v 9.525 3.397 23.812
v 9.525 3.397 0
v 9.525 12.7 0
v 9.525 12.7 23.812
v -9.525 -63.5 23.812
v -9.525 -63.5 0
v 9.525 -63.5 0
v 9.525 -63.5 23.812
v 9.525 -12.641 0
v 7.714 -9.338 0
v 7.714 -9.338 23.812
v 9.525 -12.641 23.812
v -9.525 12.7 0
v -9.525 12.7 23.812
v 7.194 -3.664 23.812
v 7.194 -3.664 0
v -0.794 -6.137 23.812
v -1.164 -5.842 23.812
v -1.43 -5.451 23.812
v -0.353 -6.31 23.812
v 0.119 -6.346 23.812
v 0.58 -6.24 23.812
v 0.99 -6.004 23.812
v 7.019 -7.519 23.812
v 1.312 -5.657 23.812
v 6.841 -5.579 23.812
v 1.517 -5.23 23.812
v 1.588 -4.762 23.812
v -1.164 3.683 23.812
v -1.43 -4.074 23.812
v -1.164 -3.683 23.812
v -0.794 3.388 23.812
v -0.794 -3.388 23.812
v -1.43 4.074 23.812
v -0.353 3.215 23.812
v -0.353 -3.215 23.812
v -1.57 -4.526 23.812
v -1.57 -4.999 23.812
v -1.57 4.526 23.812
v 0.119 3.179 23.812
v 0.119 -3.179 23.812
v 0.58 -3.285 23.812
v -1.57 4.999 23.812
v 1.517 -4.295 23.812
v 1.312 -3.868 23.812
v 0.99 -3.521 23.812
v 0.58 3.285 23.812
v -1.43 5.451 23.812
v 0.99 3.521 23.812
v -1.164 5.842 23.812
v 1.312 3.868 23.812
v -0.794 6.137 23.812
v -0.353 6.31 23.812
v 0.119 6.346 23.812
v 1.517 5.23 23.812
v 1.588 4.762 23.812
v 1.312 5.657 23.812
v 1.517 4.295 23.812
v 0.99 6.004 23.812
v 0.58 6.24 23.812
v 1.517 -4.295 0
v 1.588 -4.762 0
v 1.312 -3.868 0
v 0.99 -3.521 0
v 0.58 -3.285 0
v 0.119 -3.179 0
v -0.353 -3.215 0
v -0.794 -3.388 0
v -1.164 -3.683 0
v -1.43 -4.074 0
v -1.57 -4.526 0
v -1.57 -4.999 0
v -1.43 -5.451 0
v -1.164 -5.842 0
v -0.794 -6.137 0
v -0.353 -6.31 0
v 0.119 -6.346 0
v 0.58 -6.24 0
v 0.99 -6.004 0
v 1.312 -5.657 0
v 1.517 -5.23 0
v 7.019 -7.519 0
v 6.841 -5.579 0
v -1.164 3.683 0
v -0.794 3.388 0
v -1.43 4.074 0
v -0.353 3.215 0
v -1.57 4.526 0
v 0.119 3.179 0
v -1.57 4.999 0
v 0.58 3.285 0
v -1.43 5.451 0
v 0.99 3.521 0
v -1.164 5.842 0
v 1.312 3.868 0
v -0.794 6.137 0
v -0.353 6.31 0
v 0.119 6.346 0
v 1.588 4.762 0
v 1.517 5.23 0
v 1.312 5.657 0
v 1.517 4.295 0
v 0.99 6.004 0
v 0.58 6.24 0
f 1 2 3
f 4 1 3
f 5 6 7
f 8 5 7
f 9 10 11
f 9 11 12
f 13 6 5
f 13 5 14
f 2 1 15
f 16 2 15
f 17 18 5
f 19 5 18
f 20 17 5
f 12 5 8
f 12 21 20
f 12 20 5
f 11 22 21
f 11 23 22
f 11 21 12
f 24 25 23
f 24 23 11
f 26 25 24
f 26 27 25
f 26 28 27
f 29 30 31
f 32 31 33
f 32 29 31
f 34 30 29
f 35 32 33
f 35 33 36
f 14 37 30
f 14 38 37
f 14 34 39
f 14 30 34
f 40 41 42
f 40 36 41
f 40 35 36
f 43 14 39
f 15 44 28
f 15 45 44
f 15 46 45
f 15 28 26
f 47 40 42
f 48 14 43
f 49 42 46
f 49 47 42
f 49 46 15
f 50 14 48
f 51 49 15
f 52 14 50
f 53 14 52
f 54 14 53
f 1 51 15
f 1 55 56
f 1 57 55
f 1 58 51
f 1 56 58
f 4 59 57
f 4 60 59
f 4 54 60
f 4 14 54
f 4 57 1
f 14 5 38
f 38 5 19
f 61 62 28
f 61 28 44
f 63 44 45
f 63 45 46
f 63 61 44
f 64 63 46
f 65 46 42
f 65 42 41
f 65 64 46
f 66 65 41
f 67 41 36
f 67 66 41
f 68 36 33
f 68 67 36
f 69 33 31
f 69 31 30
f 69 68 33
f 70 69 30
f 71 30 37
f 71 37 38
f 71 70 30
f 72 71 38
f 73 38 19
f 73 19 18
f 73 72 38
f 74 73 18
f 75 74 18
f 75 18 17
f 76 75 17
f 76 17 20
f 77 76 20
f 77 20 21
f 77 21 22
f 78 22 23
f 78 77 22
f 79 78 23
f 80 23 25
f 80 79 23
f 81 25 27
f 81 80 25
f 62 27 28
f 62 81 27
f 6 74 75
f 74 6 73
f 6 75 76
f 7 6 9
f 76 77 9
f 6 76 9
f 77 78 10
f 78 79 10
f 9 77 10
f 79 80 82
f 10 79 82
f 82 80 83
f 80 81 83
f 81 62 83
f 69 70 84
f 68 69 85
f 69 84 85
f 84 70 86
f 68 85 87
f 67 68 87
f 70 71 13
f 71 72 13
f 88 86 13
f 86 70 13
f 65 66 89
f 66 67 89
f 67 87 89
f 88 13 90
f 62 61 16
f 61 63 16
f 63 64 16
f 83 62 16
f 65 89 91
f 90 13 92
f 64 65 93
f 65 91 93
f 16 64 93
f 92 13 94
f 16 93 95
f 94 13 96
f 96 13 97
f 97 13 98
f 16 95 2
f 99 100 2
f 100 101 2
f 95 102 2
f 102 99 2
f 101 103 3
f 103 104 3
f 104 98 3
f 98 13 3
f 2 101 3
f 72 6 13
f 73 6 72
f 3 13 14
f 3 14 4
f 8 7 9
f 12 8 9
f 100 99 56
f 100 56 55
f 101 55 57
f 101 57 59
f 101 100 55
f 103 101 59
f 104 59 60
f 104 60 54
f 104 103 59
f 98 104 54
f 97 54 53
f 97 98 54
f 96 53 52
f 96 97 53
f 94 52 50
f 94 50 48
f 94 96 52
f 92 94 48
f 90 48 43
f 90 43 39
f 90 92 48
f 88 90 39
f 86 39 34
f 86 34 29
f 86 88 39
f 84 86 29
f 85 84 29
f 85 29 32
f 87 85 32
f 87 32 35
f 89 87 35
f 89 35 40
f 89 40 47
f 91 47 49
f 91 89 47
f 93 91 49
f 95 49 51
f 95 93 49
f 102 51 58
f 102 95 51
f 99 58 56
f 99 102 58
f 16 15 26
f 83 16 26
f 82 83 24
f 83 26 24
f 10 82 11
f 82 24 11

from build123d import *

# Parameters (mm, degrees)
SKETCH1_W           = 19.05
SKETCH1_H           = 76.2
SKETCH1_R           = 1.5875
BOSS_EXTRUDE1_DEPTH = 23.8125
CUT_EXTRUDE1_REACH  = 25.812


with BuildPart() as part:
    # Sketch1 → Boss-Extrude1 (new body)
    with BuildSketch(Plane.XY):
        with Locations((0, -25.4)):
            Rectangle(SKETCH1_W, SKETCH1_H)
        with Locations((0, 4.7625)):
            Circle(SKETCH1_R, mode=Mode.SUBTRACT)
        with Locations((0, -4.7625)):
            Circle(SKETCH1_R, mode=Mode.SUBTRACT)
    extrude(amount=BOSS_EXTRUDE1_DEPTH)

    # Sketch3 → Cut-Extrude1 (cut, up to next)
    with BuildSketch(Plane.XY.offset(23.8125), mode=Mode.PRIVATE) as cut_extrude1_sk1:
        with BuildLine():
            Line((9.525, -12.641309428), (9.525, 3.396941189))
            Line((9.525, 3.396941189), (7.193838245, -3.663696954))
            ThreePointArc((7.193838245, -3.663696954), (6.863457725, -6.55509252), (7.713690054, -9.338332466))
            Line((7.713690054, -9.338332466), (9.525, -12.641309428))
        make_face()
    cut_extrude1_tool1 = extrude(cut_extrude1_sk1.sketch, amount=-CUT_EXTRUDE1_REACH, mode=Mode.PRIVATE) & part.part
    add(cut_extrude1_tool1.solids().sort_by_distance((8.507816, -5.222222, 23.8125))[0], mode=Mode.SUBTRACT)


solid = part.part
